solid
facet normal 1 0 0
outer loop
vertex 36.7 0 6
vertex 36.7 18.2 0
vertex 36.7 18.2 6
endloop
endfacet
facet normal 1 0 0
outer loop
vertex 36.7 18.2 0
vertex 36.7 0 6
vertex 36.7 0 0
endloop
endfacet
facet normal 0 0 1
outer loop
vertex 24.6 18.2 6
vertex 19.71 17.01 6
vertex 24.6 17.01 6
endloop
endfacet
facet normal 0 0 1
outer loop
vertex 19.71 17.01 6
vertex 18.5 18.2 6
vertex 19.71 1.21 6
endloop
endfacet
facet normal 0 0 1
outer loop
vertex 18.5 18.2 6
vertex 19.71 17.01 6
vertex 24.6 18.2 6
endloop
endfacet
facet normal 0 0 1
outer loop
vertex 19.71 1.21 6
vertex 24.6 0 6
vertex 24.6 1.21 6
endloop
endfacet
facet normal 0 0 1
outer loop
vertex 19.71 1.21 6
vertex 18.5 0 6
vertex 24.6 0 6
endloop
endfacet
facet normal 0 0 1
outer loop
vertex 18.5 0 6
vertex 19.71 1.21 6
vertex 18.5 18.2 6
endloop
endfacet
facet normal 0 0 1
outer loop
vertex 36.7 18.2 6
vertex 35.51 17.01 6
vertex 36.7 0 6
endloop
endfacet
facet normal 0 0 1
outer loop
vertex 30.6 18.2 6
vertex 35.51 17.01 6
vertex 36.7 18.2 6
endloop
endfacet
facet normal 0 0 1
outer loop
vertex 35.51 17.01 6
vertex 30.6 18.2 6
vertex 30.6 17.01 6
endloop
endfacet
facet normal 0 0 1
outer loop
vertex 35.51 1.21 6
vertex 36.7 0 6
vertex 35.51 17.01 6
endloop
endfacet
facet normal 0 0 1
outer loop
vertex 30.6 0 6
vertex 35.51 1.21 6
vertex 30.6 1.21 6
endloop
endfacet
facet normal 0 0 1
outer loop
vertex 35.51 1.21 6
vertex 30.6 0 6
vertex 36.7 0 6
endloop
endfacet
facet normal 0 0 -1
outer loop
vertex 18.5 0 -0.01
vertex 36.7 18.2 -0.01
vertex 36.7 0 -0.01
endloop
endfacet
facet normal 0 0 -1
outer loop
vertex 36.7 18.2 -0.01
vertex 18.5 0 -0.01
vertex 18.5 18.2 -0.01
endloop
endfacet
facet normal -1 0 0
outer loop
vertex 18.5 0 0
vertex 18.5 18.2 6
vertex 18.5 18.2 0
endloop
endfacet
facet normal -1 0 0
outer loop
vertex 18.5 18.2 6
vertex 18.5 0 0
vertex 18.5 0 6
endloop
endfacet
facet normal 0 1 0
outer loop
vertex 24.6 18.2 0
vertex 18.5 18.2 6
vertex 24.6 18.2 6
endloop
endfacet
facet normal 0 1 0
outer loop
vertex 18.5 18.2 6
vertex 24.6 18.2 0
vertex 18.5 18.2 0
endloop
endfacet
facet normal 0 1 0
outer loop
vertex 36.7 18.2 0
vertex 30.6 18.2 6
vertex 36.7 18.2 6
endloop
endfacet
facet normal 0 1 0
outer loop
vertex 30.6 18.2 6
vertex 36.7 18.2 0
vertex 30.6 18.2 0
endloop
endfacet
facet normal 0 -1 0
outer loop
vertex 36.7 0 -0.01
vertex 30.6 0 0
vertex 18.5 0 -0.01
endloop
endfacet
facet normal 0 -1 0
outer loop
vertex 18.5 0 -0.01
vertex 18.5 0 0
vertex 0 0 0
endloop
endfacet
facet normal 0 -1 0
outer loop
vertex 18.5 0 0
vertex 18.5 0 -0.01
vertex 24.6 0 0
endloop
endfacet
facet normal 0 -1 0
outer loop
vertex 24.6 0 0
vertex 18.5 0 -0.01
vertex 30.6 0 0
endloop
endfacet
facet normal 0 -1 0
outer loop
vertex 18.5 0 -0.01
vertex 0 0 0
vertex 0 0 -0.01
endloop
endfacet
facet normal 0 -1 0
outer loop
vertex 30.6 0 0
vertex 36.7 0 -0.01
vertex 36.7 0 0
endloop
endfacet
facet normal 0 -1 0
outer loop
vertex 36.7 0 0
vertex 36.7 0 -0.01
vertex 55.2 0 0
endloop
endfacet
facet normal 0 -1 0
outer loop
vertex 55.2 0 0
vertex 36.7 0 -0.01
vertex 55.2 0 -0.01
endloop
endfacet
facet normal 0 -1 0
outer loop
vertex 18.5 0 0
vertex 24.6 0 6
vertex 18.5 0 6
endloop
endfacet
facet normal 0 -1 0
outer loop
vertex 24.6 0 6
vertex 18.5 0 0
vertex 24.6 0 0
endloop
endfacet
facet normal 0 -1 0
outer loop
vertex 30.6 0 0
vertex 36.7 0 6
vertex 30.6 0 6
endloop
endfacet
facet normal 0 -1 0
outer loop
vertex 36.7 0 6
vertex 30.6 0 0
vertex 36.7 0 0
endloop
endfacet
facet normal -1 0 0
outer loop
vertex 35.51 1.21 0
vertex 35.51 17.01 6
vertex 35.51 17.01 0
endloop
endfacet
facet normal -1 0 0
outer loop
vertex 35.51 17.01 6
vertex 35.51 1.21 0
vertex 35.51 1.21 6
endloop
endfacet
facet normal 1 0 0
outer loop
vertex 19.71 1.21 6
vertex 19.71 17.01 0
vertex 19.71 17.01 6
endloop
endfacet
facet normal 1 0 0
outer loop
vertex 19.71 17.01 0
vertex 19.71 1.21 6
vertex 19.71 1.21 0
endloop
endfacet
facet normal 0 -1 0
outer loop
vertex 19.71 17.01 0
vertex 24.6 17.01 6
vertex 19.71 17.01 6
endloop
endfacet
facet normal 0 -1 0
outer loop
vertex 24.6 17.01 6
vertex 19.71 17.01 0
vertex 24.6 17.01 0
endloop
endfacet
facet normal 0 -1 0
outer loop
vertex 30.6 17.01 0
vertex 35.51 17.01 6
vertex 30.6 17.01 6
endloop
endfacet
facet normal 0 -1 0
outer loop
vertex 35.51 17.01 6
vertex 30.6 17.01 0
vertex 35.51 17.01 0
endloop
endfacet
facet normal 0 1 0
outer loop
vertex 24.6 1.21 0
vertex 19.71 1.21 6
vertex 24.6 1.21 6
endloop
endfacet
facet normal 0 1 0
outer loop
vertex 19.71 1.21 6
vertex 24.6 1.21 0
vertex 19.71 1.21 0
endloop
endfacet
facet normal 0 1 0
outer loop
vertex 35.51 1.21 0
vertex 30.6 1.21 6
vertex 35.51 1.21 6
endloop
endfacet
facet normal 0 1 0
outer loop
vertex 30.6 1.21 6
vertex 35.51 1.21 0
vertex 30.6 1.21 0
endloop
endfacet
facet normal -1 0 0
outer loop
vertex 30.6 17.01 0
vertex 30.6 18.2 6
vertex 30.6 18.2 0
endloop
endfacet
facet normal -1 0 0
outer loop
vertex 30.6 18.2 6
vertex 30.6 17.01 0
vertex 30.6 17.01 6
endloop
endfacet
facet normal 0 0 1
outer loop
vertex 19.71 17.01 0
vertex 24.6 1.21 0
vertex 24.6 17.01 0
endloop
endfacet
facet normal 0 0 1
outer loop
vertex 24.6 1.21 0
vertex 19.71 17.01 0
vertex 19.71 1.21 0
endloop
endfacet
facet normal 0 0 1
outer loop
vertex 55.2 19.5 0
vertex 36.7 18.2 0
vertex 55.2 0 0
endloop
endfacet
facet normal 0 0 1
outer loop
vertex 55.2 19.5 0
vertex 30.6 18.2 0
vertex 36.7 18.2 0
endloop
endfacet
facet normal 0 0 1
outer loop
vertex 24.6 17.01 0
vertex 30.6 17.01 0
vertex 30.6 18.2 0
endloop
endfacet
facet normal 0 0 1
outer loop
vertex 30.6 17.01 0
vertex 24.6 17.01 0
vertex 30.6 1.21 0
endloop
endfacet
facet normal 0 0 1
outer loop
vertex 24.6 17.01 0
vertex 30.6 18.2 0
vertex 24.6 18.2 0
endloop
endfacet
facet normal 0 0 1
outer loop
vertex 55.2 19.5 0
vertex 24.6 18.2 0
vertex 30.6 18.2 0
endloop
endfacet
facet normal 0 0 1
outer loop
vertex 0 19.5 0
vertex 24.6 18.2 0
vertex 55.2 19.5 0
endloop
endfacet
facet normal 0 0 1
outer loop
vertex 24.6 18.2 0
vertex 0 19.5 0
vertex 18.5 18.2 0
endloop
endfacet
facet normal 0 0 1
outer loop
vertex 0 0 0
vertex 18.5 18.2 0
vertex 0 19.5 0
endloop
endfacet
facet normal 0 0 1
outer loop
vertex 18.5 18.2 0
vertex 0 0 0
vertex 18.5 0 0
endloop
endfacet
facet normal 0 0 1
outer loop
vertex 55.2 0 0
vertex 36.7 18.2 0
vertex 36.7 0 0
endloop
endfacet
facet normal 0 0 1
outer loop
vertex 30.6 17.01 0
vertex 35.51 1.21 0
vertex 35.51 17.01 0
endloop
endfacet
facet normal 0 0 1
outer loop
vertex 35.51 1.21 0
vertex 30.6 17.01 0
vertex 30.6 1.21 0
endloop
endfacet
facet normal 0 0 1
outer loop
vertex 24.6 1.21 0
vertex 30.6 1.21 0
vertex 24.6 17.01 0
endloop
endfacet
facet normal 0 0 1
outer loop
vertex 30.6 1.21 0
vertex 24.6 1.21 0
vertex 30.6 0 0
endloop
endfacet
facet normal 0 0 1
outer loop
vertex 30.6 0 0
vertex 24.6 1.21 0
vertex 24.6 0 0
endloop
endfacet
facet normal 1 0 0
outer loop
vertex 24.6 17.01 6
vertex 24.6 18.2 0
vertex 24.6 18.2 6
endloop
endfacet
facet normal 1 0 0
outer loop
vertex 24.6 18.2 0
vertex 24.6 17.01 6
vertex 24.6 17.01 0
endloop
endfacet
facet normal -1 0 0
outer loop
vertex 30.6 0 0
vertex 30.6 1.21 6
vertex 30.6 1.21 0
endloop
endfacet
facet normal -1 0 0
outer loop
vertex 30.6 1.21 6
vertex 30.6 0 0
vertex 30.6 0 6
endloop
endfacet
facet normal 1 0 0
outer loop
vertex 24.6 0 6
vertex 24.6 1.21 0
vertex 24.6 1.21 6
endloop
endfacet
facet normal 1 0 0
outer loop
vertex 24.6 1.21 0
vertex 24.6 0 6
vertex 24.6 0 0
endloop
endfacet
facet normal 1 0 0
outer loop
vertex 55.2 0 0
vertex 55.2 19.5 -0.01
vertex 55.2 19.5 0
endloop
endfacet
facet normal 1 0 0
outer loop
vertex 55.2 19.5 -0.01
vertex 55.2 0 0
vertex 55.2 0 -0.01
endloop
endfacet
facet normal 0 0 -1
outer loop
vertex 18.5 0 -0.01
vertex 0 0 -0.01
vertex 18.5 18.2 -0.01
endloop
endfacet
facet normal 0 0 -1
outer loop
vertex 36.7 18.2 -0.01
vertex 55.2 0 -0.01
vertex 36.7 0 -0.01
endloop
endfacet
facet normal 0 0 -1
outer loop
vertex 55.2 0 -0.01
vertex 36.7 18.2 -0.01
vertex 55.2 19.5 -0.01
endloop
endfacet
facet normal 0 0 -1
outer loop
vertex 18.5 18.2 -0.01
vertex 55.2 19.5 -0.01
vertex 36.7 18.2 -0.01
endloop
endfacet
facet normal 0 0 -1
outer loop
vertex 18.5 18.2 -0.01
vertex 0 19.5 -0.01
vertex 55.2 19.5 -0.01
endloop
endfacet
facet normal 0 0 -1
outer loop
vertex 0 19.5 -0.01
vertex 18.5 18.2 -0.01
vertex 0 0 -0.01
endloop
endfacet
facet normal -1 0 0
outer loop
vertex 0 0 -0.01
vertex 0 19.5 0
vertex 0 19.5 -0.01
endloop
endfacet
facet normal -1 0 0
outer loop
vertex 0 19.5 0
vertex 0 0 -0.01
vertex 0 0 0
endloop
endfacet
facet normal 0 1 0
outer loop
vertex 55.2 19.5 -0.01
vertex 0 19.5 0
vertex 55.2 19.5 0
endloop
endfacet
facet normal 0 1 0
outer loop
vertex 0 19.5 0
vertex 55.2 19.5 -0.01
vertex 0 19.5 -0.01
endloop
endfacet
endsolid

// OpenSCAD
// file: ../Base/PlacementOptions.scad
// Fischertechnik Box Foundation
// Placement Options

// Alignment
NoAlign = 0;
AlignLeft = 1;
AlignBottom = 2;
AlignCenter = 3;
AlignRight = 4;
AlignTop = 5;

// Element rotation degree steps
rotations = [0, -90, -180, -270];

// Rotation
NoRotation = 0;
Rotate0 = 0;
Rotate90 = 1;
Rotate180 = 2;
Rotate270 = 3;

// Docking (seen from above)
NoDock = -1;
DockLeft = 0;
DockTop = 1;
DockRight = 2;
DockCorner = 2;
DockBottom = 3;

// Web corners
LowerLeft = 0;
UpperLeft = 1;
UpperRight = 2;
LowerRight = 3;

// Web position relative to corner
LeftOfCorner = 0;
RightOfCorner = 1;

// Rails direction
Horizontal = true;
Vertical = false;
// file: ../Base/Boxes.scad
// Fischertechnik Box Foundation
// Pre-designed Boxes

use <Constants.scad>

include <PlacementOptions.scad>

box190Width = 190;
box190Depth = 130;
box130Width = 130;
box130Depth = 95;

// Values are from an original ec3 box
topBottomDifference = 1.5;
outerHeight = 40;
baseThickness = 1.8;
innerHeight = outerHeight - baseThickness;
stackExcess = 5.7;
radius = 3.5;
wallThickness = 1.5;
tolerance = 0.2;

boxWallThickness = wallThickness;
boxBaseThickness = baseThickness;
boxWebWidth = 3.0;

// getBoxWallThickness()
// Gets the wall thickness of a Fischertechnik Box
function getBoxWallThickness() = boxWallThickness;

// getBoxUsageHeight(height = 38.2)
// Gets the usable height of a Fischertechnik box
// height = Outer height of the box from the bottom to the upper edge.
function getBoxUsageHeight(height = outerHeight) = height - baseThickness - stackExcess;

// getBoxInnerHeight()
// Gets the inner height of a Fischertechnik box, including the stack excess
function getBoxInnerHeight() = innerHeight;

// getBoxBaseThickness()
// Gets the thickness of the Fischertechnik box base.
function getBoxBaseThickness() = boxBaseThickness;

// getBoxWebWidth()
// Gets the width of a box web
function getBoxWebWidth() = boxWebWidth;

// getBox190Space()
// Gets the usable inner space of a Box 190 as an x/y-list
function getBox190Space() = [
    box190Width - 2*getBoxWallThickness() - topBottomDifference, 
    box190Depth - 2*getBoxWallThickness() - topBottomDifference ];

// RoundedCornerPlate(width, depth, height, radius)
// Creates a body plate with rounded corners for a box. Used
// also to create the complete box with the hull module.
// width = Width of the plate
// depth = depth of the plate 
// height = thickness of the plate
// radius = radius of the rounded corner
module RoundedCornerPlate(width, depth, height, radius) {
    translate([radius, radius])
    hull() {
        w = width-2*radius;
        d = depth-2*radius;
        cube([w, d, height]);
        cylinder(height, r=radius, $fn=getFragments());
        translate([w, 0])
            cylinder(height, r=radius, $fn=getFragments());
        translate([w, d])
            cylinder(height, r=radius, $fn=getFragments());
        translate([0, d])
            cylinder(height, r=radius, $fn=getFragments());
    }
}

// BoxBase(width, depth)
// Creates an empty stackable Fischertechnik compatible box
// width = Outer width of the box (190, 130, ...)
// depth = Outer depth of the box (130, 95, ...)

module BoxBase(width, depth, height=outerHeight) {    
    thinPlate = 0.01;

    innerHeight = height - baseThickness;    
    
    module Body(tolerance=tolerance) {
        hull() {
            // Bottom with tolerance to fit into the original boxes when stacked
            translate([-wallThickness+tolerance, -wallThickness+tolerance, -baseThickness])
                RoundedCornerPlate(width-topBottomDifference-2*tolerance, depth-topBottomDifference-2*tolerance, thinPlate, radius);
            
            // Top
            translate([-wallThickness-topBottomDifference/2, -wallThickness-topBottomDifference/2, innerHeight-thinPlate])
                RoundedCornerPlate(width, depth, thinPlate, radius);
         }
    }

    module Cutoff() {
        hull() {
            coWidth = width - 2*wallThickness;
            coDepth = depth - 2*wallThickness;
            
            // Bottom
            RoundedCornerPlate(coWidth-topBottomDifference, coDepth-topBottomDifference, thinPlate, radius);

            // Top
            translate([-topBottomDifference/2, -topBottomDifference/2, innerHeight+thinPlate]) 
                RoundedCornerPlate(coWidth, coDepth, thinPlate, radius);
        }
    }
    
    difference() {        
        Body();
        Cutoff();
        stackOffset = innerHeight - stackExcess;
        translate([0, 0, stackOffset + baseThickness])
            Body(tolerance=0);
    }
}

// Creates the Fischertechnik empty box 130x190 mm and places it at position 0,0
// 190x130 are the outer sizes, the inner space is slightly smaller. Use getBox190Space() to get the inner sizes.
// The box is positioned that the usable inner space is at the 0,0,0 position.

module Box190() {
    BoxBase(box190Width, box190Depth);
}

// Gets the usable inner space of a Box 130 as an x/y-list
function getBox130Space() = [
    box130Width - 2*getBoxWallThickness() - topBottomDifference, 
    box130Depth - 2*getBoxWallThickness() - topBottomDifference ];

// Creates the Fischertechnik empty box 95x130 mm and places it at position 0,0
// 190x130 are the outer sizes, the inner space is slightly smaller. Use getBox190Space() to get the inner sizes.
// The box is positioned that the usable inner space is at the 0,0,0 position.

module Box130() {
    BoxBase(box130Width, box130Depth);
}

// Creates a web at the specified box walls
// corner 0 = LowerLeft, 1 = UpperLeft, 2 = UpperRight, 3 = LowerRight
// side 0 = LeftOfCorner, 1 = RightOfCorner
// distance = Distance in mm from the corner
// boxSpace = inner width and depth of the box (default: Box 190)
// webWidth = length of the web (default is 3 mms)
// webThickness = thickness of the web (default is 1 mm)
// height = Height of the web (standard is getBoxUsageHeight())
// sink = How much of the web is sunk into the wall

module BoxWeb(
    corner, 
    side, 
    distance, 
    boxSpace=getBox190Space(), 
    webWidth=getBoxWebWidth(), 
    webThickness=1.0, 
    height=getBoxUsageHeight(),
    sink = getBoxWallThickness()/2) {
    width = (corner % 2 == 0) ? 
            (side == LeftOfCorner ? webWidth : webThickness) :
            (side == LeftOfCorner ? webThickness : webWidth);

    depth = (corner % 2 == 0) ? 
            (side == RightOfCorner ? webWidth : webThickness) :
            (side == RightOfCorner ? webThickness : webWidth);
    
    xDiff = corner == LowerLeft ? 
                (side == LeftOfCorner ? -sink : distance) :
            (corner == UpperLeft ?                
                (side == LeftOfCorner ? distance : -sink) :
            (corner == UpperRight ?
                (side == LeftOfCorner ? boxSpace.x-webWidth+sink : boxSpace.x-distance-webThickness) :
                (side == LeftOfCorner ? boxSpace.x-distance-webThickness: boxSpace.x-webWidth+sink)));

    yDiff = corner == LowerLeft ? 
                (side == RightOfCorner ? -sink : distance) :
            (corner == UpperLeft ?
                (side == RightOfCorner ? boxSpace.y-distance-webThickness : boxSpace.y-webWidth+sink) :
            (corner == UpperRight ?
                (side == RightOfCorner ? boxSpace.y-webWidth+sink : boxSpace.y-distance-webThickness) :
                (side == RightOfCorner ? distance : -sink)));
    
    translate([xDiff, yDiff, -getExcess()])
        cube([width, depth, height + 2*getExcess()]);
}
// file: ../Base/Rotation.scad
// Fischertechnik Box Foundation
// Geometry Helpers Rotation

include <PlacementOptions.scad>

// getRotatedSpace(space, rotation=NoRotation)
// Rotates the space dependent on the specified rotation

function getRotatedSpace(space, rotation=NoRotation) = [
    (rotation == Rotate90 || rotation == Rotate270) ? space.y : space.x,
    (rotation == Rotate90 || rotation == Rotate270) ? space.x : space.y
];

// Rotates the given space around the fixed left lower corner
// space = the space the children needs as width/depth list [width,depth]
// rotation = 0 Rotate0 degrees, 1 Rotate90 degrees, 2 Rotate180 degrees, 3 Rotate270 degrees (equivalent to -90)

module RotateFix(space, rotation=NoRotation) {
    dy = (rotation == Rotate0 || rotation == Rotate270) ? 0 :
        (rotation == Rotate90) ? space.x :
        space.y;
    dx = (rotation < Rotate180) ? 0 :
        (rotation == Rotate180) ? space.x :
        space.y;
    
    translate([dx, dy, 0])
        rotate([0, 0, rotations[rotation]])
            children();
}
// file: ../Base/Alignment.scad
// Fischertechnik Box Foundation
// Geometry Helpers Alignment

include <PlacementOptions.scad>

// getAlignedX(elementWidth, spaceWidth, align=AlignRight, offset=0)
// Gets the aligned X offset of an element with the given
// width in the given space.
// elementWidth = The width of the element to positon
// spaceWidth = The space where the element should be aligned
// align = 0 AlignLeft, 1 AlignCenter, 2 AlignRight
// offset = an optional offset from the aligned position. When
// aligned left or centered, then positive values are in X direction.
// When aligned right then positive values are in negative X direction.

function getAlignedX(elementWidth, spaceWidth, align=AlignRight, offset=0) =
    (align == AlignLeft) ?
        offset :
        ((align == AlignCenter) ?
        (spaceWidth - elementWidth)/2 + offset :
        spaceWidth - offset - elementWidth);

// getAlignedY(elementDepth, spaceDepth, align=AlignTop, offset=0)
// Gets the aligned Y offset of an element with the given
// depth in the given space.
// elementDepth = The depth of the element to positon
// spaceDepth = The space where the element should be aligned
// align = 0 AlignBottom, 1 AlignCenter, 2 AlignTop
// offset = an optional offset from the aligned position. When
// aligned bottom or centered, then positive values are in Y direction.
// When aligned top then positive values are in negative Y direction.

function getAlignedY(elementDepth, spaceDepth, align=AlignTop, offset=0) =
    (align == AlignBottom) ?
        offset :
        ((align == AlignCenter) ?
        (spaceDepth - elementDepth)/2 + offset :
        spaceDepth - offset - elementDepth);
// file: ../Base/Placement.scad
// Fischertechnik Box Foundation
// Geometry Helpers Placement

use <Constants.scad>
use <Alignment.scad>
use <Rotation.scad>
use <Boxes.scad>

include <PlacementOptions.scad>

// Place(x=0, y=0, elementSpace=[0,0], alignX=AlignLeft, alignY=AlignBottom, rotation=Rotate0, boxSpace=getBox190Space())
// Places the child at the specified position
// y = Y-Position. This is a relative position when an X aligment is specified.
// x = X-Position. This is a relative position when an Y aligment is specified.
// elementSpace = space of the element to be placed [x,y]
// alignX = -1=NoAlign, 0 AlignLeft, 1 AlignCenter, 3 AlignRight (elementSpace and boxSpace required!)
// alignY = -1=NoAlign, 2 AlignBottom, 1 AlignCenter, 4 AlignTop (elementSpace and boxSpace required!)
// rotation = 0 Rotate0 0 degrees, 1 Rotate90 90 degrees, 
// 2 Rotate180 180 degrees, 3 Rotate270 270 degrees (equivalent to -90)
// boxSpace = Inner space of the box where the placement occurs [x,y] - default is Box 190x130 inner space

module Place(x=0, y=0, elementSpace=[0,0], 
  alignX=AlignLeft, alignY=AlignBottom, 
  rotation=NoRotation, boxSpace=getBox190Space()) {

    module Position(x, y, space, rotation=Rotate0) {
        translate([x, y, 0])
            RotateFix(space, rotation)
                children();
    }

    space = getRotatedSpace(elementSpace, rotation);
    alignedX = getAlignedX(space.x, boxSpace.x, alignX, x);
    alignedY = getAlignedY(space.y, boxSpace.y, alignY, y);
    Position(alignedX, alignedY, elementSpace, rotation)
        children();
}

// Center(space=getBox130Space(), elementSpace=[0,0])
// space = Space where the children is centered. For cylinder use centered=true and no elementSpace.
// elementSpace = space of the element to be centered [x,y]

module Center(space=getBox190Space(), elementSpace=[0,0]) {
    Place(elementSpace=elementSpace, boxSpace=space, alignX=AlignCenter, alignY=AlignCenter)
        children();
}

// CenterHorizontal(width=0, y=0, offset=0, space=getBox130Space())
// width = Width of the element to be placed.
// y = Y position of the element
// offset = Offset from the center position (negative will be left of the center)
// space = Space where the element is placed

module CenterHorizontal(width=0, y=0, offset=0, space=getBox190Space()) {
    Place(x=offset, y=y, elementSpace=[width, 0], boxSpace=space, alignX=AlignCenter)
        children(0);
}

// CenterVertical(depth=0, x=0, offset=0, space=getBox130Space())
// depth = Depth of the element to be placed.
// x = X position of the element
// offset = Offset from the center position (negative will be down of the center)
// space = Space where the element is placed

module CenterVertical(depth=0, x=0, offset=0, space=getBox190Space()) {
    Place(x=x, y=offset, elementSpace=[0, depth], boxSpace=space, alignY=AlignCenter)
        children(0);
}

// getIsVertical(align)
// True if the specified alignment needs a vertical orientation for a divider (AlignRight, AlignLeft)

function getIsVertical(align) = (align == AlignRight || align == AlignLeft);

// getIsHorizontal(align)
// True if the specified alignment needs a horizontal orientation for a divider (AlignTop, AlignBottom)

function getIsHorizontal(align) = (align == AlignTop || align == AlignBottom);
// file: ../Base/Constants.scad
// Fischertechnik Box Foundation
// Constants

// Constant values necessary for multiple elements

// Base constants
dividerThickness = 1.2;
excess = 0.01;
fragments = 90;
tolerance = 0.8;

// Gets the thickness of a divider 
function getDividerThickness() = dividerThickness;

// Gets the excess that is used to merge walls into each other
function getExcess() = excess;

// Gets amount of fragments of a cylinder
function getFragments() = fragments;

// Gets the inner tolerance of a frame to each side
function getTolerance() = tolerance;


// Fischertechnik specific constants
axisDiameter = 4;
axisBottomDiameter = axisDiameter + 1;
axisTolerance = 0.2;
axisLockingLength = 8;

// Gets axis diameter of Fischertechnik axis
function getAxisDiameter() = axisDiameter;

// Gets axis diameter tolerance (subtracted for element axis)
function getAxisTolerance() = axisTolerance;

// Gets the axis diameter for standing axis
function getStandAxisDiameter() = getAxisDiameter() - getAxisTolerance();

// Gets axis bottom diameter for thicker part at the bottom
function getAxisBottomDiameter() = axisBottomDiameter;

// Gets the lengthh of the locking part of a locking axis
function getAxisLockingLength() = axisLockingLength;

// Studs

studHeight = 2.5;
studTolerance = 0.2;

// gets the height of a connecting stud
function getStudHeight() = studHeight;

// gets the connecting stud height tolerance
function getStudTolerance() = studTolerance;

// Dockable Frame with Edge

standardEdgeDistance = 2.5;
standardWebDistance = 11.5;
standardCornerLength = 15;

// gets the standard distance to the wall of the box for dockable frames with webs
function getStandardEdgeDistance() = standardEdgeDistance;

// gets the standard distance of each web to the corner of the dockable frame
function getStandardWebDistance() = standardWebDistance;

// gets the standard length of the corner walls of a dockable frame
function getStandardCornerLength() = standardCornerLength;

// Tubes

tubeWallFactor = 0.8;

// gets the wall thickness of a tube.
function getTubeWallThickness() = tubeWallFactor * getDividerThickness();

// Small Parts and Divider Frame

smallPartsFrameHeight = 20;

// gets the frame height for docked small parts boxes.
function getSmallPartsFrameHeight() = smallPartsFrameHeight;

// Hubs

hubRingDiameter = 19.5;
hubRingLevelDiameter = 21;

// gets the diameter of a tube matching the inner ring of a wheel
function getHubRingDiameter() = hubRingDiameter;

// gets the diameter of a hub tube with a thicker diameter
function getHubRingLevelDiameter() = hubRingLevelDiameter;

// Struts

strutAddLength = 9.0;
strutDepth = 8.0;

// gets the full length of a strut
function getFullStrutLength(length) = length + strutAddLength;

// gets the radius of the end of a strut
function getStrutEndRadius() = strutAddLength / 2;

// gets the the depth of a strut
function getStrutDepth() = strutDepth;
// main file
// Fischertechnik Box Library
// Frame for gear block for mini-motor
// 31067

use <../Base/Constants.scad>
use <../Base/Placement.scad>
use <../ModelBase/Simple.scad>

/* [Hidden] */
width = 52;
depth = 15;
height = 6;

// getFrameGearBlockSpace()
// Gets the space of a frame for a gear block (mini-mot 1)

function getFrameGearBlockSpace() = getFrameOuterVolume([width, depth + getStudHeight() - getDividerThickness(), height]);

// FrameGearBlock()
// frame for a gear block (mini-mot 1)

module FrameGearBlock() {
    Space(getFrameGearBlockSpace());
    blockWidth = 15;
    volume = [blockWidth, depth, height];
    CenterHorizontal(getFrameOuterVolume(volume).x, space=getFrameGearBlockSpace())
    {
        cutoffWidth = 6;
        difference() {
            Frame(volume);
            FrameTopCutoff(volume, cutoffWidth);
            FrameBottomCutoff(volume, cutoffWidth);
        }
    }
}

// Tests
color("lightgray")
FrameGearBlock();
